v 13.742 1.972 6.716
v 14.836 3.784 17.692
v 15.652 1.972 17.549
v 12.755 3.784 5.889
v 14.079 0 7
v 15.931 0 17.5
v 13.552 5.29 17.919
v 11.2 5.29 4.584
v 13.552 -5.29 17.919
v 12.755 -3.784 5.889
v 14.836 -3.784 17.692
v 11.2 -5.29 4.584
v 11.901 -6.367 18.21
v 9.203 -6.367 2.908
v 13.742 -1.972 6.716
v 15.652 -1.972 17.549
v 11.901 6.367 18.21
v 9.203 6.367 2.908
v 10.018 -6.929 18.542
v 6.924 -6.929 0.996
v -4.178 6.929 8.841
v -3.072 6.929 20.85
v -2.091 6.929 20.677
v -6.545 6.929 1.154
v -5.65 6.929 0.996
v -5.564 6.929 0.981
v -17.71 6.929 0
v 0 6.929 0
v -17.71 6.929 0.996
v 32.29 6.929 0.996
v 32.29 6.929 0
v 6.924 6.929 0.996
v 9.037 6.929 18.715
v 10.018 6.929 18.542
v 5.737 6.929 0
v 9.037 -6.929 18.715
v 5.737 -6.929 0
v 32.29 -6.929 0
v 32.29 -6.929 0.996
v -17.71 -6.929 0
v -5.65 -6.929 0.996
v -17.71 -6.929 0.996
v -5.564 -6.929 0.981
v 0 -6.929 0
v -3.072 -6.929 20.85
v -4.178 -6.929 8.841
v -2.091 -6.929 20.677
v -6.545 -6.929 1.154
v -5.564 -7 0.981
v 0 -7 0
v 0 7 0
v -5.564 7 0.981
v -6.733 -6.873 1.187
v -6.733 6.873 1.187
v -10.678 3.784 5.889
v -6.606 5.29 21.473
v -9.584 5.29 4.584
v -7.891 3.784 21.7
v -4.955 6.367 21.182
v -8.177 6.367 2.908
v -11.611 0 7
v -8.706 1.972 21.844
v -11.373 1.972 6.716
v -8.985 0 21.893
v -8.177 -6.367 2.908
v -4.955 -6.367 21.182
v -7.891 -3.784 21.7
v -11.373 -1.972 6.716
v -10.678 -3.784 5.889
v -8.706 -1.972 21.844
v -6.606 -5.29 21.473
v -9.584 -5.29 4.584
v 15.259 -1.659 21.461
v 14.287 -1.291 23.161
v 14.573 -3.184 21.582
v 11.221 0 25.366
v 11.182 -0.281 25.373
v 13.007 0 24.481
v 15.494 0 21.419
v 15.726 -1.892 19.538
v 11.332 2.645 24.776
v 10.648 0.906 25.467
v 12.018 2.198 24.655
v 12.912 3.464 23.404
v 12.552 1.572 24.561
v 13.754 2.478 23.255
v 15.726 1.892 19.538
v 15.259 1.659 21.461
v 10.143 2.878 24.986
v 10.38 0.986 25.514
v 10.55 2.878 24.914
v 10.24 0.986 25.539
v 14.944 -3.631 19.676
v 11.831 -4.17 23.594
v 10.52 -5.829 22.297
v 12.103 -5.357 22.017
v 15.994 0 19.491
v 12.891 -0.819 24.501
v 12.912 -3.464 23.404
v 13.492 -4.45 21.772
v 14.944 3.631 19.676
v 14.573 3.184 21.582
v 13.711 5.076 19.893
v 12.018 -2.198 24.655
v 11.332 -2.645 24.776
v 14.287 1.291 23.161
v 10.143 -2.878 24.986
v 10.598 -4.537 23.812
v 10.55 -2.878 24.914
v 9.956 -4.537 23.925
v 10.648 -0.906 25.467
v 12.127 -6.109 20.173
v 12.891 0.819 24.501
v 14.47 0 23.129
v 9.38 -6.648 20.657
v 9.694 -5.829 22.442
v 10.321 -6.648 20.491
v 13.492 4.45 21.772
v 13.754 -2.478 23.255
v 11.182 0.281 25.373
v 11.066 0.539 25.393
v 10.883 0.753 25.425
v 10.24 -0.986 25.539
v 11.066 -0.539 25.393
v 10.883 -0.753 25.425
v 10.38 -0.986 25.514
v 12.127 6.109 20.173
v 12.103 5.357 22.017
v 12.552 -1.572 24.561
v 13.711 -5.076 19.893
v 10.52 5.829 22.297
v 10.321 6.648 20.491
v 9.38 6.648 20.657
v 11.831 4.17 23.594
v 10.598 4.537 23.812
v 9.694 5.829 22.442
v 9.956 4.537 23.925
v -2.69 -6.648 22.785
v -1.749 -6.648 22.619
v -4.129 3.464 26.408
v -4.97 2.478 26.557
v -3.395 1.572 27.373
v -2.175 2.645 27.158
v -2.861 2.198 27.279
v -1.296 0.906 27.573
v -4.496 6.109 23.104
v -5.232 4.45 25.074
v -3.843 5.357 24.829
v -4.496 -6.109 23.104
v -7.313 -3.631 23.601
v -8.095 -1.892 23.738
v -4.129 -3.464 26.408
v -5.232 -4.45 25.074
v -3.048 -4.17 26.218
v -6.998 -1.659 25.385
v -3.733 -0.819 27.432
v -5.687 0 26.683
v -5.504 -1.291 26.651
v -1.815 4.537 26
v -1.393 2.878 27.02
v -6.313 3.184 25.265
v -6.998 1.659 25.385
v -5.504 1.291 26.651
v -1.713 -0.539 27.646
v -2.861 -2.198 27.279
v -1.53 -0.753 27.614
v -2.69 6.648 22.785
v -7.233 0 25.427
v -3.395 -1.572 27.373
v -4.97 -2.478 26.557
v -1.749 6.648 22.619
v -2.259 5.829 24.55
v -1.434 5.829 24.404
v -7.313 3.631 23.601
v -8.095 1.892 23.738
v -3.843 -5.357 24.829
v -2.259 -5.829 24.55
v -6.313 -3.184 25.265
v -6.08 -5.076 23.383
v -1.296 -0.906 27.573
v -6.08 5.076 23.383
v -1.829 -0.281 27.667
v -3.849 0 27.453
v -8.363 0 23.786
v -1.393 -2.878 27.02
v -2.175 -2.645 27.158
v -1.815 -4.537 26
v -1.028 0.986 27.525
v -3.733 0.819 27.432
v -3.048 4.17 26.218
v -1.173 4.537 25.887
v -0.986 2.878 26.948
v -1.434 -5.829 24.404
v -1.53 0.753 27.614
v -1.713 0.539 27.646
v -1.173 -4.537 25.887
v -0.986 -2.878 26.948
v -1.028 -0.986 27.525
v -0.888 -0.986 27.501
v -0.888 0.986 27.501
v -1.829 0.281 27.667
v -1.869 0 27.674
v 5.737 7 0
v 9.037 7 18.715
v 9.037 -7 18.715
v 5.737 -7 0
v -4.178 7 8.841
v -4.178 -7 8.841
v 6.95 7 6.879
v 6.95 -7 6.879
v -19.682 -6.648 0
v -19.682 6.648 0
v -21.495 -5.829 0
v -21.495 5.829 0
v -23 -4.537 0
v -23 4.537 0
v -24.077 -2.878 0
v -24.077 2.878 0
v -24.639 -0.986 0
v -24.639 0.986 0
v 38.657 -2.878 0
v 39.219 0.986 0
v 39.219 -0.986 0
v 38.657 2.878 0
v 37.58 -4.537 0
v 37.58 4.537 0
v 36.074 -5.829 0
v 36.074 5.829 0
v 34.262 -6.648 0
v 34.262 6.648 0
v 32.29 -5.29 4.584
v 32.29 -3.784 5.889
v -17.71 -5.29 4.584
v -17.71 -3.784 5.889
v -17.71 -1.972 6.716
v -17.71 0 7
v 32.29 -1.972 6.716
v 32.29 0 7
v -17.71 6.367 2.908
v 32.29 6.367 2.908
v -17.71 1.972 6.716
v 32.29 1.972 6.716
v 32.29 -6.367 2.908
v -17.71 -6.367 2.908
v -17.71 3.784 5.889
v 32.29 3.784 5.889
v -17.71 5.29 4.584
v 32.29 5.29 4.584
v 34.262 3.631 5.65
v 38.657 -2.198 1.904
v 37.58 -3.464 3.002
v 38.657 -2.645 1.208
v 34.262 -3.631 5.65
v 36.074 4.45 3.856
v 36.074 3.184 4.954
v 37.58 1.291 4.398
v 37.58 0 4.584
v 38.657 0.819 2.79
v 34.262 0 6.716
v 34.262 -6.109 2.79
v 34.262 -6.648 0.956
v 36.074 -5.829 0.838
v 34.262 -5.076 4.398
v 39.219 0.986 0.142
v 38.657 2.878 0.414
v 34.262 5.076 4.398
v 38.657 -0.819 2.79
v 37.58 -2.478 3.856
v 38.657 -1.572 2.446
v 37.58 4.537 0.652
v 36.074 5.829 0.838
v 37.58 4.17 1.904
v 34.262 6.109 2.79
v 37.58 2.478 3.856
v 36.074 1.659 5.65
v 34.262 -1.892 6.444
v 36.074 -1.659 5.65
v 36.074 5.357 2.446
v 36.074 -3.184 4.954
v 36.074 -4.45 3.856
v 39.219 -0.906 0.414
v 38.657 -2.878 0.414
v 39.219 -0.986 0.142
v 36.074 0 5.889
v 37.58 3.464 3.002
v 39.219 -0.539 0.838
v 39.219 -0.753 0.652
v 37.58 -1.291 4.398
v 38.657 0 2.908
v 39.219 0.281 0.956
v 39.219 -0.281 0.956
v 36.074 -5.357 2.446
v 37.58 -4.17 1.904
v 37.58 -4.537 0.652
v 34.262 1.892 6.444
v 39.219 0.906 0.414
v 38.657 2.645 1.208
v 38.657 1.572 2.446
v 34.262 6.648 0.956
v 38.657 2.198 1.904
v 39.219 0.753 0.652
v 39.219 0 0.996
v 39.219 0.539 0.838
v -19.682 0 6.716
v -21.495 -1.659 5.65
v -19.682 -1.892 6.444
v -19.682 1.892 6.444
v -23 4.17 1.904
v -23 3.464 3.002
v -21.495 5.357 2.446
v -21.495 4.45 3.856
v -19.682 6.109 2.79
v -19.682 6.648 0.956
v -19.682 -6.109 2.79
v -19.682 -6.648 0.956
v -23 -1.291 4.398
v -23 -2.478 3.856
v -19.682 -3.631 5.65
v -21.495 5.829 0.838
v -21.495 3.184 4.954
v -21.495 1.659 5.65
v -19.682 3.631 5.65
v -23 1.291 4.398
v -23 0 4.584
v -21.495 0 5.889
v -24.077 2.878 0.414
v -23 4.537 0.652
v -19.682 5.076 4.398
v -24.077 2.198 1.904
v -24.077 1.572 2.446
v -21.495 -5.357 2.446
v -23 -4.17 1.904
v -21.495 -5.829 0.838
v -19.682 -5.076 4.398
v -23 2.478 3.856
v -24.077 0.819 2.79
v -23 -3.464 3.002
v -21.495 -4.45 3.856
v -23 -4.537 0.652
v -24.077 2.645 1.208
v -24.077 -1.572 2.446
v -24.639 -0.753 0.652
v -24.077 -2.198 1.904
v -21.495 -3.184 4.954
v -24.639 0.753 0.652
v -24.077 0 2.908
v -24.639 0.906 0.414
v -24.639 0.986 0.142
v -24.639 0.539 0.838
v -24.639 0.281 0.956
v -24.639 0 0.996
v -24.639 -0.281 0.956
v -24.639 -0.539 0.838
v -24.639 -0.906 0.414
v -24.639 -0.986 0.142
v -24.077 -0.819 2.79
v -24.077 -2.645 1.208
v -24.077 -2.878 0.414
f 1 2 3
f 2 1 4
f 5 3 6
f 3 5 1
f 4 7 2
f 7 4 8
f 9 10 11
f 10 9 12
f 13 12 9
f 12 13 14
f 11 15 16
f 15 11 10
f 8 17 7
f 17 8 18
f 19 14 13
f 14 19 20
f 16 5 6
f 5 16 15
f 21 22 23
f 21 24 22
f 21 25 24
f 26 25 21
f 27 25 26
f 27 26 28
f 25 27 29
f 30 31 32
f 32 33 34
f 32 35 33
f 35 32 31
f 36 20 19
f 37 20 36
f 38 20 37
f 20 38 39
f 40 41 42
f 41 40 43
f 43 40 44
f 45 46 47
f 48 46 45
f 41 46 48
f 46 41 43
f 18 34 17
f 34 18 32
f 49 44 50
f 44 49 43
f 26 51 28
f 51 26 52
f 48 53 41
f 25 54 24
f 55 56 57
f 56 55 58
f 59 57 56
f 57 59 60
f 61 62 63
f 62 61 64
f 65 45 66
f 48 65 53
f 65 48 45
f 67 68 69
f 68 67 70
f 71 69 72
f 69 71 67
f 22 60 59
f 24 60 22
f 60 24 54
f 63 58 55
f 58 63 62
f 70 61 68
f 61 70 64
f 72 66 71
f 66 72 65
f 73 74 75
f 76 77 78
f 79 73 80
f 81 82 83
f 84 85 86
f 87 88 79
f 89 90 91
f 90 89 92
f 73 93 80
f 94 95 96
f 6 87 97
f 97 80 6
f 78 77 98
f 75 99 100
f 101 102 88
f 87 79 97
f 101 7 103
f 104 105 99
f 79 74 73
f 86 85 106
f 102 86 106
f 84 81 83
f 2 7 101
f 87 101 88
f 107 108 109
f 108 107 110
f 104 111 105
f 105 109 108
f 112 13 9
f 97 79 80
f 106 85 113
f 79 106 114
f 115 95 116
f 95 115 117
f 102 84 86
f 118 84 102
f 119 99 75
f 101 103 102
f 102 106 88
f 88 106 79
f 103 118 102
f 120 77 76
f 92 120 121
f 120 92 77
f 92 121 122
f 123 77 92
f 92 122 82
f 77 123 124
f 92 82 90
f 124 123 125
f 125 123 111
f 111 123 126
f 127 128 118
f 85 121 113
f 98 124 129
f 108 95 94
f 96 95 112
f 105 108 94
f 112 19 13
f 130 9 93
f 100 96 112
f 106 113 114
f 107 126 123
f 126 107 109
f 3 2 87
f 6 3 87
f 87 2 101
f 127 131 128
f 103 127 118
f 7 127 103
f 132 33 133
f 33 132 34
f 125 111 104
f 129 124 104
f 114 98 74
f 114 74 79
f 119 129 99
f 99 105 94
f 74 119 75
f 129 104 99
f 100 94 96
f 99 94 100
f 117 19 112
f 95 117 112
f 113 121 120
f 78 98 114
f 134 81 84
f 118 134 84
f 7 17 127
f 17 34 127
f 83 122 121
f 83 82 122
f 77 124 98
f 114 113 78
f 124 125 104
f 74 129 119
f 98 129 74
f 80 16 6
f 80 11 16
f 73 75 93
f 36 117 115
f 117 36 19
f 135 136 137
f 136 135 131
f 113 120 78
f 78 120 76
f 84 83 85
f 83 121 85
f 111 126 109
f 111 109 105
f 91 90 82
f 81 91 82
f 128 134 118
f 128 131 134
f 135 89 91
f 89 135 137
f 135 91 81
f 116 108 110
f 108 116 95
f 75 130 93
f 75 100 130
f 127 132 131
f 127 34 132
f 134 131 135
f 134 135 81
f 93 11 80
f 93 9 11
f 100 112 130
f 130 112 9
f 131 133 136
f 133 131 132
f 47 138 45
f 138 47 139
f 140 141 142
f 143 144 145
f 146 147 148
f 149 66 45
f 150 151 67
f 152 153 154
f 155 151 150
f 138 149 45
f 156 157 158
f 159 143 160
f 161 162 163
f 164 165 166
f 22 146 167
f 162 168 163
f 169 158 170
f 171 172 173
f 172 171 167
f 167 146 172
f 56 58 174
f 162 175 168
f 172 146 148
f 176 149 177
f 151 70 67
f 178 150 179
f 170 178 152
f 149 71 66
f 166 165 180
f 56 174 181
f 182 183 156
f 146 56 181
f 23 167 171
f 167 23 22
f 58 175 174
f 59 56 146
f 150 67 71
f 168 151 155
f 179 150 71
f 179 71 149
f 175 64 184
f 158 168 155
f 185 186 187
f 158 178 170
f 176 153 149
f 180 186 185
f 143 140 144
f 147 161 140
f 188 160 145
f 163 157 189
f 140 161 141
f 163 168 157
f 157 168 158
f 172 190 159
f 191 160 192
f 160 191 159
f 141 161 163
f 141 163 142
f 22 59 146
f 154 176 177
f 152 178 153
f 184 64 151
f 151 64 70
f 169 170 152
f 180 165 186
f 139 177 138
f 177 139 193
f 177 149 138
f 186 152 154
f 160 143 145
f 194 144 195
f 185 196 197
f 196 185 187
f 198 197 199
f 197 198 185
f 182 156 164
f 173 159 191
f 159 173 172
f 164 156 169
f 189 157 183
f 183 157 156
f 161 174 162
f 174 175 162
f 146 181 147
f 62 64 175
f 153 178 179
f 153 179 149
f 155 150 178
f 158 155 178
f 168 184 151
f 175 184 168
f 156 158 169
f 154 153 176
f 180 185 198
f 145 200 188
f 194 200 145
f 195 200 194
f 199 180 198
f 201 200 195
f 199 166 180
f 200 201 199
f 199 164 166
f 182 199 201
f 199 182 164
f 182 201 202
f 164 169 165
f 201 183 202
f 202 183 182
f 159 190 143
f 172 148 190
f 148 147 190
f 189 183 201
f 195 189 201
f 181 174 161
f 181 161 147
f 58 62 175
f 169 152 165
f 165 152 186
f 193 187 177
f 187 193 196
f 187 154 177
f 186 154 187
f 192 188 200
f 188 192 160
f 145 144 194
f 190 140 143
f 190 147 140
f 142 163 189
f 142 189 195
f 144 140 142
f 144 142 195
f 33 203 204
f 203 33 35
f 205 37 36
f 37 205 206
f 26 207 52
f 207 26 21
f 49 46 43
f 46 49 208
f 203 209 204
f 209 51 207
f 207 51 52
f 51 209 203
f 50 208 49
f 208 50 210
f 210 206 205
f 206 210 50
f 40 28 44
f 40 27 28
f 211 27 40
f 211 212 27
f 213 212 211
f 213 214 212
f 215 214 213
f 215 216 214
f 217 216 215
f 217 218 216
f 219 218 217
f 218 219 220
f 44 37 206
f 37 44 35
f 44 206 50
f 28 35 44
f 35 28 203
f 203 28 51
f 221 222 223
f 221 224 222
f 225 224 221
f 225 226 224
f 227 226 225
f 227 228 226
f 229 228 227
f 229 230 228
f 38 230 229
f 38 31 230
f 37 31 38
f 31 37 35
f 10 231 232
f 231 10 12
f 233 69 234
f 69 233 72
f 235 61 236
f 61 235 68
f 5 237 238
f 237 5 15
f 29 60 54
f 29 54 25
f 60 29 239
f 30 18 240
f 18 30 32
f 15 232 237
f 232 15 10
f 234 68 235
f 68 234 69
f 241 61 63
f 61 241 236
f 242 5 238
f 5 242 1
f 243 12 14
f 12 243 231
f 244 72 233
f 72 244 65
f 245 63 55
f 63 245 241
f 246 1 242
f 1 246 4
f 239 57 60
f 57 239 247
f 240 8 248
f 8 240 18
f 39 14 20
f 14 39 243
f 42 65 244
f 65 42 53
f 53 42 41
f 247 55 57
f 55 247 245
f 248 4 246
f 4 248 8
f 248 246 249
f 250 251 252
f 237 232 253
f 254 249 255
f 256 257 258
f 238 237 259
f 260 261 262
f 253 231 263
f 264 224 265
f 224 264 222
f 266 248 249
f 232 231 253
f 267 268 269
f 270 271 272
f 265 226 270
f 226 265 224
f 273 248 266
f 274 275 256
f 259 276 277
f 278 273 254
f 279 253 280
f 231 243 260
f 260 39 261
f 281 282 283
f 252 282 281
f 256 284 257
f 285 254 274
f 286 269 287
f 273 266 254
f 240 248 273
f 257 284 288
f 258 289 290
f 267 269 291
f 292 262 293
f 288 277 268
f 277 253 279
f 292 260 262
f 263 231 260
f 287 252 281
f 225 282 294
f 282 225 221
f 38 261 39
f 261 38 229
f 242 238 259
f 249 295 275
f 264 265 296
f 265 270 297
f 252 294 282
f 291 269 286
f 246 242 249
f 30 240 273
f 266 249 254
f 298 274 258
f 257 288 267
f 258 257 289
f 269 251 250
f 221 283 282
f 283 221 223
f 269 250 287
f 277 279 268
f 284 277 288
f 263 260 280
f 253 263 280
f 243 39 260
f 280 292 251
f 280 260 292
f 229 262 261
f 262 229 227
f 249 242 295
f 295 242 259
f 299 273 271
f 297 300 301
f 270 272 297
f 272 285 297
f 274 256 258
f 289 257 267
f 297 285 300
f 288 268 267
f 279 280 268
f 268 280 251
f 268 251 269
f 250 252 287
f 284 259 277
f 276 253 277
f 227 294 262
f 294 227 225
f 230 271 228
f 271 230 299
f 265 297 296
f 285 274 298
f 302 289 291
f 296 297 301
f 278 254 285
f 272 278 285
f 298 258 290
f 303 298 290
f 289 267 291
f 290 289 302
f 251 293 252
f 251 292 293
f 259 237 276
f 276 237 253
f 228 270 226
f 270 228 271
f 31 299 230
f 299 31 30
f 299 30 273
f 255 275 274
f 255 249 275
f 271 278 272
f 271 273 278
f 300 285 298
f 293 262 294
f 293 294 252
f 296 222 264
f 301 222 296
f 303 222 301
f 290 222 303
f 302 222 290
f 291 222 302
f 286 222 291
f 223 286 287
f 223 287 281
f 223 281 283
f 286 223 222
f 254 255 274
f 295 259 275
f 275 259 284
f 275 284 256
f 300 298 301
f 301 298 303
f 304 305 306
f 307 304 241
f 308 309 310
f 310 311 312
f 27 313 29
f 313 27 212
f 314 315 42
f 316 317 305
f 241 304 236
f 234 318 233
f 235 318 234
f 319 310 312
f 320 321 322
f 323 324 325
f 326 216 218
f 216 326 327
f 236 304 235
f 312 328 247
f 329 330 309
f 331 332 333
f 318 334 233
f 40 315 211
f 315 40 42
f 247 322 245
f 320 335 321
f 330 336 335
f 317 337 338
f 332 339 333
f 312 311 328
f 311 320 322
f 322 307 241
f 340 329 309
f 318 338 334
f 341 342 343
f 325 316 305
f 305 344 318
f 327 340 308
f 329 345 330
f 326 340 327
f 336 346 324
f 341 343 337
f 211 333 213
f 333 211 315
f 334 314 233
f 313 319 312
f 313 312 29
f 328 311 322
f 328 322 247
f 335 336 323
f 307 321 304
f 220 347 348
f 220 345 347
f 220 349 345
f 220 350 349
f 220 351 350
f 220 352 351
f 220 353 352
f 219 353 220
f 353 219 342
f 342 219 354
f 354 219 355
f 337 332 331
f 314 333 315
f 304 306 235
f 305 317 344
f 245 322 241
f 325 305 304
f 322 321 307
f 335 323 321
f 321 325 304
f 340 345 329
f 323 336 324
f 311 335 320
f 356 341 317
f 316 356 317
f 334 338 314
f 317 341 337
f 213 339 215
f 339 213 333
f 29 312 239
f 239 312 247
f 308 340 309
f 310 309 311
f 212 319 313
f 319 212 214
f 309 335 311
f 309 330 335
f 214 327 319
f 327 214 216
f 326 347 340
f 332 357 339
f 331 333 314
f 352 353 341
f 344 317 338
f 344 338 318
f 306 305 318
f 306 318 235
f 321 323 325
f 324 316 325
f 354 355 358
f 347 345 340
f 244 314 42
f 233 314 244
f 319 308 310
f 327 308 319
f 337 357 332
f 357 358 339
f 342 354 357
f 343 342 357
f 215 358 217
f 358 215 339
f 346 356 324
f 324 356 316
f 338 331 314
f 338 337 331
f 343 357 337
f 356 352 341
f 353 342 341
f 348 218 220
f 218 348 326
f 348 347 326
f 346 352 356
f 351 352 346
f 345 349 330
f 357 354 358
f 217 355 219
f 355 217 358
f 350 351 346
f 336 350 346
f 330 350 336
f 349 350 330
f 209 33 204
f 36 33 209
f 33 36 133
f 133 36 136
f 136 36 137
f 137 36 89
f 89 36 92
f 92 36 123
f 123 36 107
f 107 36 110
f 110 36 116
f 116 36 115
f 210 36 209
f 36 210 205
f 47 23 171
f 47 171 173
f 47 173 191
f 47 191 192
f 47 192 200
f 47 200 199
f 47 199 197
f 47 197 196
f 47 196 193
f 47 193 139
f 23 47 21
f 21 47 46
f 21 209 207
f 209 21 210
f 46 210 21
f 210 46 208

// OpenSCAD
// Stand for a phone
// Rounded corners
// Accounts for phone thickness, width, & center of mass
// Default values are for the Nexus S: 
// 11.3mm wide end, 9mm narrow end, but 11.3mm works for both

lscreen=100;
angle=10;
tstand=7;
hstand=20;
lphone=150;
wphone=68;
function cg(tphone)=(wphone/2+tstand+tphone/2*sin(angle))*sin(angle);
lfoot=50;

stand(11.3);
//stand(9);

module phone(tphone){
	rotate([0,angle,0]) translate([0,0,wphone/2+tstand+tphone/2*sin(angle)]) cube([tphone,lphone,wphone],center=true);
}

module vertical(tphone){
	lvertical=2*tstand+tphone;
	hcutout=lvertical/2*sin(angle);
	difference(){
		rotate([0,angle,0]){
			translate([tphone/2,0]) cylinder(r=tstand,h=hstand);
			translate([-tphone/2,0]) cylinder(r=tstand,h=hstand);
			translate([tphone/2,0,hstand]) sphere(r=tstand);
			translate([-tphone/2,0,hstand]) sphere(r=tstand);
			translate([0,0,hstand/2]) cube([tphone,2*tstand,hstand],center=true);
		}
		translate([0,0,-hcutout/2]) cube([2*lvertical,tstand*2+1,hcutout],center=true);
	}
}

module foot(tphone){
	translate([cg(tphone),0]) difference(){
		union(){
			rotate([0,90,0]){
				cylinder(r=tstand,h=lfoot,center=true);
				translate([0,0,lfoot/2]) sphere(r=tstand);
				translate([0,0,-lfoot/2]) sphere(r=tstand);
			}
		}
		translate([0,0,-tstand/2-1]) cube([lfoot+2*tstand+1,2*tstand+1,tstand+2],center=true);
	}
}

module stand(tphone){
	difference(){
		union(){
			vertical(tphone);
			foot(tphone);
		}
		phone(tphone);
	}
}
